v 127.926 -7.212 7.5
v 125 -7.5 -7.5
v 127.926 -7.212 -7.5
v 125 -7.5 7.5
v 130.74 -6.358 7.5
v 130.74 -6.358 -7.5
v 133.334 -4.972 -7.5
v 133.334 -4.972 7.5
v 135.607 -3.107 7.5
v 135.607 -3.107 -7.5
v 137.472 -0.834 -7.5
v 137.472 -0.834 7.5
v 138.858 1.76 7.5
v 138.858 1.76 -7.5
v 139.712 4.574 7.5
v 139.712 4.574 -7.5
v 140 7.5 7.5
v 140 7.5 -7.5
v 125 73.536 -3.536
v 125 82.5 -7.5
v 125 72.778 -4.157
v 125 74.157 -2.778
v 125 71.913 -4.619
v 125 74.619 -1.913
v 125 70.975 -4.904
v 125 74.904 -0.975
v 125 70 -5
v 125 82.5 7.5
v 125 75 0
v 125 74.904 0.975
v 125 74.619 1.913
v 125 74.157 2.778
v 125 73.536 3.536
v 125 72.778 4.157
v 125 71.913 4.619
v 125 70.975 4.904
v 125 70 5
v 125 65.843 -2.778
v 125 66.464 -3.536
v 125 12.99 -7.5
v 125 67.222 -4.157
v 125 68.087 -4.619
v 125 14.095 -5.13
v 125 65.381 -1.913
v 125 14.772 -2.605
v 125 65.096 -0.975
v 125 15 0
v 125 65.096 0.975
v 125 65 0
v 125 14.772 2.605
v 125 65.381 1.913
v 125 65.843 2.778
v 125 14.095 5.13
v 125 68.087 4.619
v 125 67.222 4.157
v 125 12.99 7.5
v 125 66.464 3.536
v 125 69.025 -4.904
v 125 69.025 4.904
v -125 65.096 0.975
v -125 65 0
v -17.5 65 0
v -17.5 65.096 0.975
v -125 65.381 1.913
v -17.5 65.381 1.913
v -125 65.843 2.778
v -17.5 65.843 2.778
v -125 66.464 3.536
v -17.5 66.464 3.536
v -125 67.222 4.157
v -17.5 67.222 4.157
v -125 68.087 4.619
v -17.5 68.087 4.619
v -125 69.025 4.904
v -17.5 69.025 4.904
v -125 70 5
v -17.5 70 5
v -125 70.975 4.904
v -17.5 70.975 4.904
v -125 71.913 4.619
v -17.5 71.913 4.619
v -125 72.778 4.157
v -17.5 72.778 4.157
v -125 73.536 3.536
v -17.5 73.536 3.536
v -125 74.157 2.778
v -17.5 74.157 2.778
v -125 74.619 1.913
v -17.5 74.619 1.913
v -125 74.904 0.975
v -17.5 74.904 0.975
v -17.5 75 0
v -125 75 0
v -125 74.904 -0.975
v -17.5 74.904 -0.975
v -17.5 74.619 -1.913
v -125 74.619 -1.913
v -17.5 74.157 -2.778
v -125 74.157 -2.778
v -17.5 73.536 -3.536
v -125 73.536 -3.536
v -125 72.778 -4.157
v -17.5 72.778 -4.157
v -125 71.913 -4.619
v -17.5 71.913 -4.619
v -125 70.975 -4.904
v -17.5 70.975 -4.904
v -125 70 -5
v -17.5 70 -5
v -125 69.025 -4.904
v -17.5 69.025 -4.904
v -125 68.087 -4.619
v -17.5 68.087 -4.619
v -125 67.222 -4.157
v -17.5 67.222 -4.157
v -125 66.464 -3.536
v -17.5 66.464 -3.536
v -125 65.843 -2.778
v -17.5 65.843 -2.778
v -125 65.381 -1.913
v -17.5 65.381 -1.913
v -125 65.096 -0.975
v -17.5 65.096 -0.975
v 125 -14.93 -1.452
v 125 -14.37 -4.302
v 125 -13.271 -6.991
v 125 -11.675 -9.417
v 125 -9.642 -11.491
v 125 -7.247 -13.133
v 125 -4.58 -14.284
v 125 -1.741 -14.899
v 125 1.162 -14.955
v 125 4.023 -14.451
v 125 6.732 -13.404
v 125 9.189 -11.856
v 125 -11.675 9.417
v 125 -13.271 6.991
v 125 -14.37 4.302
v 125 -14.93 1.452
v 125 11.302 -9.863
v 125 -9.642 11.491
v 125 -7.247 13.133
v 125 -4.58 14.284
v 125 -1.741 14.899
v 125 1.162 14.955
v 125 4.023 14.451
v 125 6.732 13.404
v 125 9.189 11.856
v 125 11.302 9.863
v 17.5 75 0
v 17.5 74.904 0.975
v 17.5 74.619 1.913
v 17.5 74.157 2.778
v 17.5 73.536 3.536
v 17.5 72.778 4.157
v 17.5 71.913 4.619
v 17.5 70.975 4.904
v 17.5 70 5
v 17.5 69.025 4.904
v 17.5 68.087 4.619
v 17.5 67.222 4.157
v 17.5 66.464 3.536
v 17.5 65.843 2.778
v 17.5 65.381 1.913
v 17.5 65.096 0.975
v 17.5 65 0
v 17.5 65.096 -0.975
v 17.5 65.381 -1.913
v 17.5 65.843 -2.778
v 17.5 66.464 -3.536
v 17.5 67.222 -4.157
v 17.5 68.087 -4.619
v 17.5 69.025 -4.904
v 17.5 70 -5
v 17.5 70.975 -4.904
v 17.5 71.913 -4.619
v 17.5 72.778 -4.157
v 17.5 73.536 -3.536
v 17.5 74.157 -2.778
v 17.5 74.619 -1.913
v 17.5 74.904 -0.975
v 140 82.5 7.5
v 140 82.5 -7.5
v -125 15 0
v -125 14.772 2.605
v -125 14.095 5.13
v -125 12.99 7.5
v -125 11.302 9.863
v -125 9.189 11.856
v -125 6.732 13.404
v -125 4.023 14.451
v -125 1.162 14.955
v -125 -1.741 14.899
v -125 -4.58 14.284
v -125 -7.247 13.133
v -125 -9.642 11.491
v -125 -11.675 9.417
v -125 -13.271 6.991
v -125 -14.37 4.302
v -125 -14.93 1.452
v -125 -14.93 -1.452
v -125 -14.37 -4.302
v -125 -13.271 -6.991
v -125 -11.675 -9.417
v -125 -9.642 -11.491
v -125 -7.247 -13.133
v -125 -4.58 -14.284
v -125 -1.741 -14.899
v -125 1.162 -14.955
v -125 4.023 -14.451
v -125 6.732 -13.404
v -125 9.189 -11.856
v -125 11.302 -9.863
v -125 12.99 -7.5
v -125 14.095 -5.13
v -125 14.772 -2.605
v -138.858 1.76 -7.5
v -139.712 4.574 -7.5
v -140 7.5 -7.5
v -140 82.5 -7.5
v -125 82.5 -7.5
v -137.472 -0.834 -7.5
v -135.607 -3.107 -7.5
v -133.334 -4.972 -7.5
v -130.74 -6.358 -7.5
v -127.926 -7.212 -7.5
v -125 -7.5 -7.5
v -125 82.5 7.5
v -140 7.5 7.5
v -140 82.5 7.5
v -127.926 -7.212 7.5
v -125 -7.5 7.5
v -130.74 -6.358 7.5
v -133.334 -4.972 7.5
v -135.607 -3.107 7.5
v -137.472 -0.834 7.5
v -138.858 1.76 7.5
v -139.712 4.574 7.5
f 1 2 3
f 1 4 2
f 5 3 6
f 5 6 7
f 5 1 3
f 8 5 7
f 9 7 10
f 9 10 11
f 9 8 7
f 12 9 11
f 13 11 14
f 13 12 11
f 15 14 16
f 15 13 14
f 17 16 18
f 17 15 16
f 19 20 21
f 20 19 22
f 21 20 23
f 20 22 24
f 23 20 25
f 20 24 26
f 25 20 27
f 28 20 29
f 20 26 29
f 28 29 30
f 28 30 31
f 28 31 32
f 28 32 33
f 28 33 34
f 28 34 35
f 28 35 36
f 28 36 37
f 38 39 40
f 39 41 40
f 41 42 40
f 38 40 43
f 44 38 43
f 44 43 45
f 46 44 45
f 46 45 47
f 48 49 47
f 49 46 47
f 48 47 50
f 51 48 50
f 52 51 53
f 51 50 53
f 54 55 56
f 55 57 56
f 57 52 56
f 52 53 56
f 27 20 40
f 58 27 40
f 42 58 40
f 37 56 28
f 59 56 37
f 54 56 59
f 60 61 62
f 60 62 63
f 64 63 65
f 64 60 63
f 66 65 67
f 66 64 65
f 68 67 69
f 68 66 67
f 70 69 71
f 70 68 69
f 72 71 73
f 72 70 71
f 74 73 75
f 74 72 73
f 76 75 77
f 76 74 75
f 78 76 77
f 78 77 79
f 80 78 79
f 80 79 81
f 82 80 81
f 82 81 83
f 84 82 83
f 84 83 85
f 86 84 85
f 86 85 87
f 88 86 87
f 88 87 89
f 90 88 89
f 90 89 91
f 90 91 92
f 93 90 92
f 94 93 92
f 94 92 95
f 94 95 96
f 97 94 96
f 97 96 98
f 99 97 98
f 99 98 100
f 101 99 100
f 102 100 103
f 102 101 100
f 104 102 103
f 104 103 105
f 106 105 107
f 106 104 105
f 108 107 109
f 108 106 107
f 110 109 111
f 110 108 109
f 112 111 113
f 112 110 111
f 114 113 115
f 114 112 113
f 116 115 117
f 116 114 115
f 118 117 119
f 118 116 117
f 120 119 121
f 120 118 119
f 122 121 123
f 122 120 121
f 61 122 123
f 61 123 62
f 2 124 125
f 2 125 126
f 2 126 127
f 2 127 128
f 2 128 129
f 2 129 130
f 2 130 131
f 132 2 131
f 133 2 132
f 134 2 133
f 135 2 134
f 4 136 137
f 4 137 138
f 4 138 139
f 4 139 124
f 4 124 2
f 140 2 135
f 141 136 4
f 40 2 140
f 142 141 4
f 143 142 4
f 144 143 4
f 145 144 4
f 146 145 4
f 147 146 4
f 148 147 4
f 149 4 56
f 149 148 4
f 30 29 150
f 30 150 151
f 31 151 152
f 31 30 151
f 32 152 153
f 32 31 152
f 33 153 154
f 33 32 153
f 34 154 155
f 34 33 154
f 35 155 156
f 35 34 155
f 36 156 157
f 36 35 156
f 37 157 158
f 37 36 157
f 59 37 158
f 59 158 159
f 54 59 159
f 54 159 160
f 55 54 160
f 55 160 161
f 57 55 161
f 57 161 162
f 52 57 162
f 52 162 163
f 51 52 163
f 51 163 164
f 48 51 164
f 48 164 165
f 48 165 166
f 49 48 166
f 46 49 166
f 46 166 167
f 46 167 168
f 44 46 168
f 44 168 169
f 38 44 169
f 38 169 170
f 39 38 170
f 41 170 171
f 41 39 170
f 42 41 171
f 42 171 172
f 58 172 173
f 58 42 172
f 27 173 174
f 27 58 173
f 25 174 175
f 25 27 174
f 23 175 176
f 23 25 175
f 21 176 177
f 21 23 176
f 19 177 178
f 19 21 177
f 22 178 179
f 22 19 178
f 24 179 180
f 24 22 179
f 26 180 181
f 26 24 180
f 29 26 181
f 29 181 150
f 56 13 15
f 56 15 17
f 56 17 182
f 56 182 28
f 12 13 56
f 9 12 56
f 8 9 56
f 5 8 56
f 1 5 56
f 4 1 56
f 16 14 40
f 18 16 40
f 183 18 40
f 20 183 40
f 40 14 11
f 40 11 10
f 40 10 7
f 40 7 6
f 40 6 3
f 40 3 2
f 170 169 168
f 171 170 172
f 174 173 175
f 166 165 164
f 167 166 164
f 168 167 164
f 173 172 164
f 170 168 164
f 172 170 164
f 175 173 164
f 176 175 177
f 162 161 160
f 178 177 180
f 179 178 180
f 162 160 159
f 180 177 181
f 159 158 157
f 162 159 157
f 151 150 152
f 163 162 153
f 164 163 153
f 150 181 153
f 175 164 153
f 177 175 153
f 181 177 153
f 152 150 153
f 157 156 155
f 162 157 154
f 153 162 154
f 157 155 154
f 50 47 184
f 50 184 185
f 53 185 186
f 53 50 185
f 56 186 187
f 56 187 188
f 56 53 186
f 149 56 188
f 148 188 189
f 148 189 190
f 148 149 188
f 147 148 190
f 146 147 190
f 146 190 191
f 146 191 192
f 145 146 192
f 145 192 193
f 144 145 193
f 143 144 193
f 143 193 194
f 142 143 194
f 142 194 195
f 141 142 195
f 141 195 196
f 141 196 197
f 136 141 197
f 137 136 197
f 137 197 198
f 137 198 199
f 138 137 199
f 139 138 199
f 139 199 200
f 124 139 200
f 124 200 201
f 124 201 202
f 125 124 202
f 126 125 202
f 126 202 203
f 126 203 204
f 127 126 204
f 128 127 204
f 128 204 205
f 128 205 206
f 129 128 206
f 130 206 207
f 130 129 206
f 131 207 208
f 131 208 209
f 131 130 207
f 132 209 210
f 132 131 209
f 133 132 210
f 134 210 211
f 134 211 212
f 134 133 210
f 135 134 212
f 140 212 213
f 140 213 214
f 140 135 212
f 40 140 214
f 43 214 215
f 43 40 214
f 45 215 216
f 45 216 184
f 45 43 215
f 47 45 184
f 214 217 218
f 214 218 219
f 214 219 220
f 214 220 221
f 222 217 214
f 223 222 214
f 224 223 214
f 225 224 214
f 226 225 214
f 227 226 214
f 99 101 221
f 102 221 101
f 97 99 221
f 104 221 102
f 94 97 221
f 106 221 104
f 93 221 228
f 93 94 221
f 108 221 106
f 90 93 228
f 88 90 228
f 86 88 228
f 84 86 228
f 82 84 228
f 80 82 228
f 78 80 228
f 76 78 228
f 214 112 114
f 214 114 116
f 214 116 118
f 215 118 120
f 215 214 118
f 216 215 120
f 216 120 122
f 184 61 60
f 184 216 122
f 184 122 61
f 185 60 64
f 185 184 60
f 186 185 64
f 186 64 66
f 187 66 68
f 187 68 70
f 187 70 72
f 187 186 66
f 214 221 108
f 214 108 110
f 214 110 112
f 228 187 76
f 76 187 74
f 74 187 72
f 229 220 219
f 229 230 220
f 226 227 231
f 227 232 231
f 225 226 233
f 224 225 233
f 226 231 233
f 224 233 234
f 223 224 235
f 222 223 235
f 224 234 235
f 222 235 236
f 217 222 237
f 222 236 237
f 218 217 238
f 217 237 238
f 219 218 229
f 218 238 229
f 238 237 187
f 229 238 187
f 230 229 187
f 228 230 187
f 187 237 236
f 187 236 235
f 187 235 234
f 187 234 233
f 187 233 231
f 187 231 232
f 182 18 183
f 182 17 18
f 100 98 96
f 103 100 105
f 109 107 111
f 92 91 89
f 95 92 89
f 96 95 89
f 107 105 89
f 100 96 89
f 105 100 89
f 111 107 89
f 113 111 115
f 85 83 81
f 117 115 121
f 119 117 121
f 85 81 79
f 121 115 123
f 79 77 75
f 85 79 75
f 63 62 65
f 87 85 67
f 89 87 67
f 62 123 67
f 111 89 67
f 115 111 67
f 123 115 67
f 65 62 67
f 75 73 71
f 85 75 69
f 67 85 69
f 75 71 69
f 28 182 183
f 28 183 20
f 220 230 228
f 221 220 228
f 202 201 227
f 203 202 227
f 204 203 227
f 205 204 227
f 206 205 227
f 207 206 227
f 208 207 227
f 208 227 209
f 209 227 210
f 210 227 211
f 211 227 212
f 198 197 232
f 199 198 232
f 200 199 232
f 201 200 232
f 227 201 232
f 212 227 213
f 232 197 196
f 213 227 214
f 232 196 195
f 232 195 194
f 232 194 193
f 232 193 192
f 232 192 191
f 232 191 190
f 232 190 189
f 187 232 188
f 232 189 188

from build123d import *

# Parameters (mm, degrees)
F0_R      = 15
F1_DEPTH  = 125
F2_W      = 15
F2_H      = 15
F3_ANGLE  = 90
F5_W      = 15
F5_H      = 15
F6_DEPTH  = 75
F8_R      = 5
F9_DEPTH  = 122.5
F10_R     = 5
F11_DEPTH = 122.5


with BuildPart() as f1:
    # F0 (on Right) → F1 (new body, symmetric)
    with BuildSketch(Plane.YZ):
        Circle(F0_R)
    extrude(amount=F1_DEPTH, both=True)

    # F4: F3 across plane


with BuildPart() as f3:
    # F2 (on face) → F3 (revolve)
    with BuildSketch(Plane.YZ.offset(125)):
        Rectangle(F2_W, F2_H)
    revolve(axis=Axis((125, 7.5, 0), (0, 0, 1)), revolution_arc=F3_ANGLE)


with BuildPart() as f1_1:
    add(f1.part)
    add(f3.part.mirror(Plane.YZ))


    add(f3.part)  # F6 merges F3
    # F5 (on face) → F6 (join)
    with BuildSketch(Plane(origin=(0, 7.5, 0), x_dir=(-1, 0, 0), z_dir=(0, 1, 0))):
        with Locations((-132.5, 0)):
            Rectangle(F5_W, F5_H)
    extrude(amount=F6_DEPTH)

    # F7: F1 across plane


with BuildPart() as f1_2:
    add(f1_1.part)
    add(f1_1.part.mirror(Plane.YZ))

    # F8 (on face) → F9 (join)
    with BuildSketch(Plane(origin=(-140, 0, 0), x_dir=(0, -1, 0), z_dir=(-1, 0, 0))):
        with Locations((-70, 0)):
            Circle(F8_R)
    extrude(amount=-F9_DEPTH)

    # F10 (on face) → F11 (join)
    with BuildSketch(Plane.YZ.offset(140)):
        with Locations((70, 0)):
            Circle(F10_R)
    extrude(amount=-F11_DEPTH)


solid = f1_2.part
